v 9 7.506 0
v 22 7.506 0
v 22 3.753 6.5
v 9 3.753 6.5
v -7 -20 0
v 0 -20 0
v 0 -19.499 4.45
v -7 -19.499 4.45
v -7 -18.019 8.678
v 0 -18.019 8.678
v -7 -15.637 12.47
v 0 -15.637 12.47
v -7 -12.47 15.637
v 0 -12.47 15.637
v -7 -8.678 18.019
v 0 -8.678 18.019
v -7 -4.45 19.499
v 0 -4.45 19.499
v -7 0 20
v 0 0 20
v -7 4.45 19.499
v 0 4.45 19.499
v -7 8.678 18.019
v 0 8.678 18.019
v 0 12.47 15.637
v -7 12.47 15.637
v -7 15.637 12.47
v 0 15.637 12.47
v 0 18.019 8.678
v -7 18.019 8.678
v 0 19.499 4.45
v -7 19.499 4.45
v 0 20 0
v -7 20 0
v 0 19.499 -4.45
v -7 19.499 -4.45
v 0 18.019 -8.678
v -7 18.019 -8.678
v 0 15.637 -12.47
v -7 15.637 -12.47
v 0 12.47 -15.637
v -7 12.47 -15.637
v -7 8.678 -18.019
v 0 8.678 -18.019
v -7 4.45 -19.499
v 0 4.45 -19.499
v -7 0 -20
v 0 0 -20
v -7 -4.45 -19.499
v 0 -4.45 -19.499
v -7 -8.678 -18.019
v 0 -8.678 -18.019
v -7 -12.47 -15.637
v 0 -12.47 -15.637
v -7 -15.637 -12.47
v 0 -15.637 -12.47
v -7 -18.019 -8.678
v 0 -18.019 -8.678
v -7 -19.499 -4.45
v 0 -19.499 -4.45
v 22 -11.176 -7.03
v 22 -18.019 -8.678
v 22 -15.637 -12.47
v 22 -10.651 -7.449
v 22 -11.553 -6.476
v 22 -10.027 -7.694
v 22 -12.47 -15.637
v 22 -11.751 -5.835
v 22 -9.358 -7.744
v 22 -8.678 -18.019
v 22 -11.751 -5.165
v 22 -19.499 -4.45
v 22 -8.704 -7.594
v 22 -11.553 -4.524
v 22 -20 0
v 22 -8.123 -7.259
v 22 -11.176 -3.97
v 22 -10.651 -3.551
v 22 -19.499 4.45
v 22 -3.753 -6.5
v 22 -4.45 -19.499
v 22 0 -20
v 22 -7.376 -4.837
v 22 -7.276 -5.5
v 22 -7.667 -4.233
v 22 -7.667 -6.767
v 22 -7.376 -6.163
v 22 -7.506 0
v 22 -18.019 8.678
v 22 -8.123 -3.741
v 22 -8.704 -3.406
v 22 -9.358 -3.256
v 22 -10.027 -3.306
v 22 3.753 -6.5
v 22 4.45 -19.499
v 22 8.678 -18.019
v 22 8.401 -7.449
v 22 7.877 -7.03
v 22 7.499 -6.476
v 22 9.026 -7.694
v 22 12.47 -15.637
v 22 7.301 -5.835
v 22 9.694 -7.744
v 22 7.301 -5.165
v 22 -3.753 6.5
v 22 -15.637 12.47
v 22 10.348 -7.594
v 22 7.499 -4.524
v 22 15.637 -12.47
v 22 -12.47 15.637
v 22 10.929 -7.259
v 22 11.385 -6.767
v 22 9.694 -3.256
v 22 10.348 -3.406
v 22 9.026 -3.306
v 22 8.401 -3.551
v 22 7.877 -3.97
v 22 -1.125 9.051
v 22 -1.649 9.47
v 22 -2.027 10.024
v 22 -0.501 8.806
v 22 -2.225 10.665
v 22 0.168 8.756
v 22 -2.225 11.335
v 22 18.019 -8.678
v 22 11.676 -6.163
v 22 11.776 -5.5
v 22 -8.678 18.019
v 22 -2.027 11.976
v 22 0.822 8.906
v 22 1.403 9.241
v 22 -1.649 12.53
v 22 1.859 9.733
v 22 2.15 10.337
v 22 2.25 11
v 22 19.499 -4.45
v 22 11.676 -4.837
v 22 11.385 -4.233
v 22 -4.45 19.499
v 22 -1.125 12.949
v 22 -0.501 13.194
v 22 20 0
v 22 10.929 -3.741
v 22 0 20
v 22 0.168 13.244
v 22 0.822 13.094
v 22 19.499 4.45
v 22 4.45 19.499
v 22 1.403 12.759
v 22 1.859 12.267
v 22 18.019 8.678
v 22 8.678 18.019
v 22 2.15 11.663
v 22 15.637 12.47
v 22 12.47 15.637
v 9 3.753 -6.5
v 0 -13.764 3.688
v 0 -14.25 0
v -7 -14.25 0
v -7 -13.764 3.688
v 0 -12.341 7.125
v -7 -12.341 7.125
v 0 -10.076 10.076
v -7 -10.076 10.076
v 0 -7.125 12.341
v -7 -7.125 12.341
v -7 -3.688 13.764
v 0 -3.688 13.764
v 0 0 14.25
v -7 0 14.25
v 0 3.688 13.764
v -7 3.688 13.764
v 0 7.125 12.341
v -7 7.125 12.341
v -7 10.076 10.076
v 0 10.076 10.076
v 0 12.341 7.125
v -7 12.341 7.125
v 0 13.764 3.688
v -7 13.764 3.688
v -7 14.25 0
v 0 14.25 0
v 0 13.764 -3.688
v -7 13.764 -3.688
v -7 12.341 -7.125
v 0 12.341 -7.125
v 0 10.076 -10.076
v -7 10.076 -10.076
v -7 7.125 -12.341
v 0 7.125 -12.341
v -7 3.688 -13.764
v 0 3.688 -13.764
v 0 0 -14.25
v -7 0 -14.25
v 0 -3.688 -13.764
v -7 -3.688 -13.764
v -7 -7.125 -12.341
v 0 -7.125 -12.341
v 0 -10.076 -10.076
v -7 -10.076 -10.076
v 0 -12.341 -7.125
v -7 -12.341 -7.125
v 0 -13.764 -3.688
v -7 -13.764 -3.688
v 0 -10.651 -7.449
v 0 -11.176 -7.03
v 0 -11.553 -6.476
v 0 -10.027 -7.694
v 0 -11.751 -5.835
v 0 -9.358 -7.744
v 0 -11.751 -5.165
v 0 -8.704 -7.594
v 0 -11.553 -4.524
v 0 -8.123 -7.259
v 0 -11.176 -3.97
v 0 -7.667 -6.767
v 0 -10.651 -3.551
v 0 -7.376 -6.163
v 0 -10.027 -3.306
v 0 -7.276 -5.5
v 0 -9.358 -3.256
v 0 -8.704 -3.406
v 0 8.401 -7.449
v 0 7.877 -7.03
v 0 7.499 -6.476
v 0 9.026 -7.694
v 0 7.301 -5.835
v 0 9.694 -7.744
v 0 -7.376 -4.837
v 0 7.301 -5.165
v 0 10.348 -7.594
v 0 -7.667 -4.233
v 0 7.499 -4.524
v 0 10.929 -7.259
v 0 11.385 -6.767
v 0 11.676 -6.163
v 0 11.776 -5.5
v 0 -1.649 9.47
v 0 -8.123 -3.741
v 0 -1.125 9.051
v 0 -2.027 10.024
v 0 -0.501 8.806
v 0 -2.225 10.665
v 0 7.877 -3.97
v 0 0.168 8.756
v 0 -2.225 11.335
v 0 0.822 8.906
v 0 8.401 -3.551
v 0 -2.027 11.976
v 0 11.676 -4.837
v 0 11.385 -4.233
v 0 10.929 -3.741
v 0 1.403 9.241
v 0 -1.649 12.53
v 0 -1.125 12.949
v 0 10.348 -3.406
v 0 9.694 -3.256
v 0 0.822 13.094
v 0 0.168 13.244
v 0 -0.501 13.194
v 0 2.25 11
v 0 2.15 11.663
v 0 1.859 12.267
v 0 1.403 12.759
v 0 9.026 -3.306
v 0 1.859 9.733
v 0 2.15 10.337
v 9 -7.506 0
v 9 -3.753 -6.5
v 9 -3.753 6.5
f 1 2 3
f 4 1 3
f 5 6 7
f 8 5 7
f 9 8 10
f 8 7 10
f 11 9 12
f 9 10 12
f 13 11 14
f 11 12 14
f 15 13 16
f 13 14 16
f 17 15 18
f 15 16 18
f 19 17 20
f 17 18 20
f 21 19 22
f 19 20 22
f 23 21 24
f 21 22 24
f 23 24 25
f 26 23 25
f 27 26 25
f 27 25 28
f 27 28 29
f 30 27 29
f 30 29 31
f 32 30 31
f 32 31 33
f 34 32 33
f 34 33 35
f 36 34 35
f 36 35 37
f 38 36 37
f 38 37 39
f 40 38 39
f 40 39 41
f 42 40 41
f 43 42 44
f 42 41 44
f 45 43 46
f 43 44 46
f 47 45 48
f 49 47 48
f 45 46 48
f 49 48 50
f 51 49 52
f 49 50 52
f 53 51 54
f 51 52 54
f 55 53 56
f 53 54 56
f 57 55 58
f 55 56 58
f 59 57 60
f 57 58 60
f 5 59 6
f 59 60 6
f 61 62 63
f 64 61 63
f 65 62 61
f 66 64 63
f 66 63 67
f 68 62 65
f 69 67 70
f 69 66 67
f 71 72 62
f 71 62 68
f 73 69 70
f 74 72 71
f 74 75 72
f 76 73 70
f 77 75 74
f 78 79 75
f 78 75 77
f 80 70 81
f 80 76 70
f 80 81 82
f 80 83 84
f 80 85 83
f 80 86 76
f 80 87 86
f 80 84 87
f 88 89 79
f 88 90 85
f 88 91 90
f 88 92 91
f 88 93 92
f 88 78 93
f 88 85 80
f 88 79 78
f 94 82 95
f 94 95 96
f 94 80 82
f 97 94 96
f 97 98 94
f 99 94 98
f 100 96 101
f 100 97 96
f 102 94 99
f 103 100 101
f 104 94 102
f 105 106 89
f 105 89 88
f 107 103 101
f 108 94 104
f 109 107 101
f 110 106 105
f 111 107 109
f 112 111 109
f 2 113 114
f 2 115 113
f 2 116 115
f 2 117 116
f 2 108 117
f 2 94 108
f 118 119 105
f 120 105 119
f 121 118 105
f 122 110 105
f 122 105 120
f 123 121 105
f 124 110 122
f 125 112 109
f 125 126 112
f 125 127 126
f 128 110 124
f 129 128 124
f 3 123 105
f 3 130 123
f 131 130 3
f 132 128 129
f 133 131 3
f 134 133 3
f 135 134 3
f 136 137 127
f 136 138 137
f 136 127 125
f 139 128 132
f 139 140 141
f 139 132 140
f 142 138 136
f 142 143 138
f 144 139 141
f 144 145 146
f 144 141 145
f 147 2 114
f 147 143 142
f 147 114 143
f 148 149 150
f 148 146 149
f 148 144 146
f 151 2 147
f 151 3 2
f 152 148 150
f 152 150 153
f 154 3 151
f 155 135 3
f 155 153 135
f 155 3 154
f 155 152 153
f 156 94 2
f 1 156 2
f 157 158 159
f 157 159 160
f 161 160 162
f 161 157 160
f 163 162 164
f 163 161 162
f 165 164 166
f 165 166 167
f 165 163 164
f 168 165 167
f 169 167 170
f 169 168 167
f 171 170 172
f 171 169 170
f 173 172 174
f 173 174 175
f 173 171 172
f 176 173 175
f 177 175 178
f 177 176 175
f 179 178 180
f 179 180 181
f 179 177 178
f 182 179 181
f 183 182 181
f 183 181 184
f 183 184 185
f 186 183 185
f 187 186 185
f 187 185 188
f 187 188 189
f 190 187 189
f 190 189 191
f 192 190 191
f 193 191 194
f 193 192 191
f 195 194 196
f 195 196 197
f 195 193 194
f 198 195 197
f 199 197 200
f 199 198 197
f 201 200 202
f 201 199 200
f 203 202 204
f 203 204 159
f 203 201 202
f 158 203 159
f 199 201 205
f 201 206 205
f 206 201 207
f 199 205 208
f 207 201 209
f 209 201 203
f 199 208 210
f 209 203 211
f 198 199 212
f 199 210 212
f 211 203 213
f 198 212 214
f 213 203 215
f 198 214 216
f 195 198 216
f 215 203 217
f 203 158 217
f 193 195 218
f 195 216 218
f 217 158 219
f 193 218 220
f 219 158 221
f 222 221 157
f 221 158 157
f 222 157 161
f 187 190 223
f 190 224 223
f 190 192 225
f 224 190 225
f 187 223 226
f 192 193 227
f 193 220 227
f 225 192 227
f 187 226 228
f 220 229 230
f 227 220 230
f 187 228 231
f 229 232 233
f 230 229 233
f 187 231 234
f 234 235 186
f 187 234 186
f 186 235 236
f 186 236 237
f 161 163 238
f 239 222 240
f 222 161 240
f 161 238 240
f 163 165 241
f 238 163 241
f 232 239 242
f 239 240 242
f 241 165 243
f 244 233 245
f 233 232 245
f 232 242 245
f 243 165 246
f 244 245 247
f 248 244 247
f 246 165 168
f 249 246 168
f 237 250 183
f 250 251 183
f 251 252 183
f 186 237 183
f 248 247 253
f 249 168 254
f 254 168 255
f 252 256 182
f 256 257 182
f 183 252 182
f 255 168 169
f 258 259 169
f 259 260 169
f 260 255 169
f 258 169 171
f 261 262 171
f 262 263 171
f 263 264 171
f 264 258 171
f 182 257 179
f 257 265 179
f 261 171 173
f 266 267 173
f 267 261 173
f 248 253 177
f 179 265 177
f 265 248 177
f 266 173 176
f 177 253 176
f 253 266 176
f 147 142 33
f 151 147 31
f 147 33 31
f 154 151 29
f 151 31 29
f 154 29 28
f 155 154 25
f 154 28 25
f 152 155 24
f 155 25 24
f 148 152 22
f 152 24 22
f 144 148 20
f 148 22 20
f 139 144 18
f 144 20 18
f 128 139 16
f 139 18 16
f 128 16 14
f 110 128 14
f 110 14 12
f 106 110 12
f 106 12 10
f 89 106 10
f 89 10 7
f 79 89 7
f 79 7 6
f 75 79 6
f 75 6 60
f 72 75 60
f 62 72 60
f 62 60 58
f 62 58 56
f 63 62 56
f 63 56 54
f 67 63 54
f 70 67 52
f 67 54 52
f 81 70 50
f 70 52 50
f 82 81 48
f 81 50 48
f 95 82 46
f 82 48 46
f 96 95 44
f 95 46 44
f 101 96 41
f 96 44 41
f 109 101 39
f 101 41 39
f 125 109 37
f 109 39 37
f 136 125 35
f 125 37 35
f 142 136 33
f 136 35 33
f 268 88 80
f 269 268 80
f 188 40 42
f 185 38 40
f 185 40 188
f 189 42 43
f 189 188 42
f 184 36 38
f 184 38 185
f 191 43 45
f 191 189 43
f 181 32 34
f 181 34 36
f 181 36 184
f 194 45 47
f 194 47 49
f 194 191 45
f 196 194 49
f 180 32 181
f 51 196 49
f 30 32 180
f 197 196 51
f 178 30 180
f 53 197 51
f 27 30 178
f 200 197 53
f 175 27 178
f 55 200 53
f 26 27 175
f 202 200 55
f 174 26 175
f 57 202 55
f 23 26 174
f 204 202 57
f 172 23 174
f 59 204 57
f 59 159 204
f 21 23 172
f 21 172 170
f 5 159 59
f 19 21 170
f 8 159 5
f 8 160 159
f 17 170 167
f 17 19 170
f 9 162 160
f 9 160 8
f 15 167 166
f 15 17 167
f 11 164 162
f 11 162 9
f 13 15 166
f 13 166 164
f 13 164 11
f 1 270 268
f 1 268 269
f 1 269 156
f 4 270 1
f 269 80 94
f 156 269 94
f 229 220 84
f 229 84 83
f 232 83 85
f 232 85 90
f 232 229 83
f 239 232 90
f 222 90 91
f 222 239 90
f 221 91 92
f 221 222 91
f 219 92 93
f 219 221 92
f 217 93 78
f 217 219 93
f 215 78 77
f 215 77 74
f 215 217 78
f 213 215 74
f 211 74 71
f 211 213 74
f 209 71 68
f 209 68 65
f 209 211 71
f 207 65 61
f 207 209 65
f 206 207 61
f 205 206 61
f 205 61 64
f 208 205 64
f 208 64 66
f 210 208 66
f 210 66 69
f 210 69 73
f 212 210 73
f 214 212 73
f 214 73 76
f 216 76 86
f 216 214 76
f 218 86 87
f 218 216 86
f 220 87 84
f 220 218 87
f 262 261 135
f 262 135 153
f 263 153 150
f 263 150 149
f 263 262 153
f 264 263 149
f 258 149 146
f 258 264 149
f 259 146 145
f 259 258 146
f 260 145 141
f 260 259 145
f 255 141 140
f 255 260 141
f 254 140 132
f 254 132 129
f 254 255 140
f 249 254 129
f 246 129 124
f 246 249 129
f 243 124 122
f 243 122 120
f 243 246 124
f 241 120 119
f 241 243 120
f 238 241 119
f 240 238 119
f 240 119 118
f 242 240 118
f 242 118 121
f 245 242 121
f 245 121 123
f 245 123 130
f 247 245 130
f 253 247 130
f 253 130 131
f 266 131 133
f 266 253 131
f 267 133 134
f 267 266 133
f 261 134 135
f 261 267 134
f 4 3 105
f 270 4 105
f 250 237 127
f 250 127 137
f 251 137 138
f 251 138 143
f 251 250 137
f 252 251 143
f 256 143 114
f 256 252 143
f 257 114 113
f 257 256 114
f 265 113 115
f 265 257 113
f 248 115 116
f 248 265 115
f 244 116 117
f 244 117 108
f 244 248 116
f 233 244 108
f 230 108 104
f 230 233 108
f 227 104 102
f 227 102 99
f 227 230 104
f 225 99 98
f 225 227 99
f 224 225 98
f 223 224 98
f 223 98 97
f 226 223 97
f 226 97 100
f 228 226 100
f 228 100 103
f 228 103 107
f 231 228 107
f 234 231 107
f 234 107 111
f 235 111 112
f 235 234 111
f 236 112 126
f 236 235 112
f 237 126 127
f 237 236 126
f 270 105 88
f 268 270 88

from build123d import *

# Parameters (mm, degrees)
F0_R     = 20
F0_R_2   = 2.25
F1_DEPTH = 22
F2_R     = 20
F2_R_2   = 14.25
F3_DEPTH = 7
F5_DEPTH = 13


with BuildPart() as f1:
    # F0 (on Right) → F1 (new body)
    with BuildSketch(Plane.YZ):
        Circle(F0_R)
        with Locations((-9.526279, -5.5)):
            Circle(F0_R_2, mode=Mode.SUBTRACT)
        with Locations((9.526279, -5.5)):
            Circle(F0_R_2, mode=Mode.SUBTRACT)
        with Locations((0, 11)):
            Circle(F0_R_2, mode=Mode.SUBTRACT)
    extrude(amount=F1_DEPTH)

    # F2 (on face) → F3 (join)
    with BuildSketch(Plane(origin=(0, 0, 0), x_dir=(0, -1, 0), z_dir=(-1, 0, 0))):
        Circle(F2_R)
        Circle(F2_R_2, mode=Mode.SUBTRACT)
    extrude(amount=F3_DEPTH)

    # F4 (on face) → F5 (cut)
    with BuildSketch(Plane.YZ.offset(22)):
        Polygon((3.752777, 6.5), (-3.752777, 6.5), (-7.505553, 0), (-3.752777, -6.5), (3.752777, -6.5), (7.505553, 0), align=None)
    extrude(amount=-F5_DEPTH, mode=Mode.SUBTRACT)


solid = f1.part
